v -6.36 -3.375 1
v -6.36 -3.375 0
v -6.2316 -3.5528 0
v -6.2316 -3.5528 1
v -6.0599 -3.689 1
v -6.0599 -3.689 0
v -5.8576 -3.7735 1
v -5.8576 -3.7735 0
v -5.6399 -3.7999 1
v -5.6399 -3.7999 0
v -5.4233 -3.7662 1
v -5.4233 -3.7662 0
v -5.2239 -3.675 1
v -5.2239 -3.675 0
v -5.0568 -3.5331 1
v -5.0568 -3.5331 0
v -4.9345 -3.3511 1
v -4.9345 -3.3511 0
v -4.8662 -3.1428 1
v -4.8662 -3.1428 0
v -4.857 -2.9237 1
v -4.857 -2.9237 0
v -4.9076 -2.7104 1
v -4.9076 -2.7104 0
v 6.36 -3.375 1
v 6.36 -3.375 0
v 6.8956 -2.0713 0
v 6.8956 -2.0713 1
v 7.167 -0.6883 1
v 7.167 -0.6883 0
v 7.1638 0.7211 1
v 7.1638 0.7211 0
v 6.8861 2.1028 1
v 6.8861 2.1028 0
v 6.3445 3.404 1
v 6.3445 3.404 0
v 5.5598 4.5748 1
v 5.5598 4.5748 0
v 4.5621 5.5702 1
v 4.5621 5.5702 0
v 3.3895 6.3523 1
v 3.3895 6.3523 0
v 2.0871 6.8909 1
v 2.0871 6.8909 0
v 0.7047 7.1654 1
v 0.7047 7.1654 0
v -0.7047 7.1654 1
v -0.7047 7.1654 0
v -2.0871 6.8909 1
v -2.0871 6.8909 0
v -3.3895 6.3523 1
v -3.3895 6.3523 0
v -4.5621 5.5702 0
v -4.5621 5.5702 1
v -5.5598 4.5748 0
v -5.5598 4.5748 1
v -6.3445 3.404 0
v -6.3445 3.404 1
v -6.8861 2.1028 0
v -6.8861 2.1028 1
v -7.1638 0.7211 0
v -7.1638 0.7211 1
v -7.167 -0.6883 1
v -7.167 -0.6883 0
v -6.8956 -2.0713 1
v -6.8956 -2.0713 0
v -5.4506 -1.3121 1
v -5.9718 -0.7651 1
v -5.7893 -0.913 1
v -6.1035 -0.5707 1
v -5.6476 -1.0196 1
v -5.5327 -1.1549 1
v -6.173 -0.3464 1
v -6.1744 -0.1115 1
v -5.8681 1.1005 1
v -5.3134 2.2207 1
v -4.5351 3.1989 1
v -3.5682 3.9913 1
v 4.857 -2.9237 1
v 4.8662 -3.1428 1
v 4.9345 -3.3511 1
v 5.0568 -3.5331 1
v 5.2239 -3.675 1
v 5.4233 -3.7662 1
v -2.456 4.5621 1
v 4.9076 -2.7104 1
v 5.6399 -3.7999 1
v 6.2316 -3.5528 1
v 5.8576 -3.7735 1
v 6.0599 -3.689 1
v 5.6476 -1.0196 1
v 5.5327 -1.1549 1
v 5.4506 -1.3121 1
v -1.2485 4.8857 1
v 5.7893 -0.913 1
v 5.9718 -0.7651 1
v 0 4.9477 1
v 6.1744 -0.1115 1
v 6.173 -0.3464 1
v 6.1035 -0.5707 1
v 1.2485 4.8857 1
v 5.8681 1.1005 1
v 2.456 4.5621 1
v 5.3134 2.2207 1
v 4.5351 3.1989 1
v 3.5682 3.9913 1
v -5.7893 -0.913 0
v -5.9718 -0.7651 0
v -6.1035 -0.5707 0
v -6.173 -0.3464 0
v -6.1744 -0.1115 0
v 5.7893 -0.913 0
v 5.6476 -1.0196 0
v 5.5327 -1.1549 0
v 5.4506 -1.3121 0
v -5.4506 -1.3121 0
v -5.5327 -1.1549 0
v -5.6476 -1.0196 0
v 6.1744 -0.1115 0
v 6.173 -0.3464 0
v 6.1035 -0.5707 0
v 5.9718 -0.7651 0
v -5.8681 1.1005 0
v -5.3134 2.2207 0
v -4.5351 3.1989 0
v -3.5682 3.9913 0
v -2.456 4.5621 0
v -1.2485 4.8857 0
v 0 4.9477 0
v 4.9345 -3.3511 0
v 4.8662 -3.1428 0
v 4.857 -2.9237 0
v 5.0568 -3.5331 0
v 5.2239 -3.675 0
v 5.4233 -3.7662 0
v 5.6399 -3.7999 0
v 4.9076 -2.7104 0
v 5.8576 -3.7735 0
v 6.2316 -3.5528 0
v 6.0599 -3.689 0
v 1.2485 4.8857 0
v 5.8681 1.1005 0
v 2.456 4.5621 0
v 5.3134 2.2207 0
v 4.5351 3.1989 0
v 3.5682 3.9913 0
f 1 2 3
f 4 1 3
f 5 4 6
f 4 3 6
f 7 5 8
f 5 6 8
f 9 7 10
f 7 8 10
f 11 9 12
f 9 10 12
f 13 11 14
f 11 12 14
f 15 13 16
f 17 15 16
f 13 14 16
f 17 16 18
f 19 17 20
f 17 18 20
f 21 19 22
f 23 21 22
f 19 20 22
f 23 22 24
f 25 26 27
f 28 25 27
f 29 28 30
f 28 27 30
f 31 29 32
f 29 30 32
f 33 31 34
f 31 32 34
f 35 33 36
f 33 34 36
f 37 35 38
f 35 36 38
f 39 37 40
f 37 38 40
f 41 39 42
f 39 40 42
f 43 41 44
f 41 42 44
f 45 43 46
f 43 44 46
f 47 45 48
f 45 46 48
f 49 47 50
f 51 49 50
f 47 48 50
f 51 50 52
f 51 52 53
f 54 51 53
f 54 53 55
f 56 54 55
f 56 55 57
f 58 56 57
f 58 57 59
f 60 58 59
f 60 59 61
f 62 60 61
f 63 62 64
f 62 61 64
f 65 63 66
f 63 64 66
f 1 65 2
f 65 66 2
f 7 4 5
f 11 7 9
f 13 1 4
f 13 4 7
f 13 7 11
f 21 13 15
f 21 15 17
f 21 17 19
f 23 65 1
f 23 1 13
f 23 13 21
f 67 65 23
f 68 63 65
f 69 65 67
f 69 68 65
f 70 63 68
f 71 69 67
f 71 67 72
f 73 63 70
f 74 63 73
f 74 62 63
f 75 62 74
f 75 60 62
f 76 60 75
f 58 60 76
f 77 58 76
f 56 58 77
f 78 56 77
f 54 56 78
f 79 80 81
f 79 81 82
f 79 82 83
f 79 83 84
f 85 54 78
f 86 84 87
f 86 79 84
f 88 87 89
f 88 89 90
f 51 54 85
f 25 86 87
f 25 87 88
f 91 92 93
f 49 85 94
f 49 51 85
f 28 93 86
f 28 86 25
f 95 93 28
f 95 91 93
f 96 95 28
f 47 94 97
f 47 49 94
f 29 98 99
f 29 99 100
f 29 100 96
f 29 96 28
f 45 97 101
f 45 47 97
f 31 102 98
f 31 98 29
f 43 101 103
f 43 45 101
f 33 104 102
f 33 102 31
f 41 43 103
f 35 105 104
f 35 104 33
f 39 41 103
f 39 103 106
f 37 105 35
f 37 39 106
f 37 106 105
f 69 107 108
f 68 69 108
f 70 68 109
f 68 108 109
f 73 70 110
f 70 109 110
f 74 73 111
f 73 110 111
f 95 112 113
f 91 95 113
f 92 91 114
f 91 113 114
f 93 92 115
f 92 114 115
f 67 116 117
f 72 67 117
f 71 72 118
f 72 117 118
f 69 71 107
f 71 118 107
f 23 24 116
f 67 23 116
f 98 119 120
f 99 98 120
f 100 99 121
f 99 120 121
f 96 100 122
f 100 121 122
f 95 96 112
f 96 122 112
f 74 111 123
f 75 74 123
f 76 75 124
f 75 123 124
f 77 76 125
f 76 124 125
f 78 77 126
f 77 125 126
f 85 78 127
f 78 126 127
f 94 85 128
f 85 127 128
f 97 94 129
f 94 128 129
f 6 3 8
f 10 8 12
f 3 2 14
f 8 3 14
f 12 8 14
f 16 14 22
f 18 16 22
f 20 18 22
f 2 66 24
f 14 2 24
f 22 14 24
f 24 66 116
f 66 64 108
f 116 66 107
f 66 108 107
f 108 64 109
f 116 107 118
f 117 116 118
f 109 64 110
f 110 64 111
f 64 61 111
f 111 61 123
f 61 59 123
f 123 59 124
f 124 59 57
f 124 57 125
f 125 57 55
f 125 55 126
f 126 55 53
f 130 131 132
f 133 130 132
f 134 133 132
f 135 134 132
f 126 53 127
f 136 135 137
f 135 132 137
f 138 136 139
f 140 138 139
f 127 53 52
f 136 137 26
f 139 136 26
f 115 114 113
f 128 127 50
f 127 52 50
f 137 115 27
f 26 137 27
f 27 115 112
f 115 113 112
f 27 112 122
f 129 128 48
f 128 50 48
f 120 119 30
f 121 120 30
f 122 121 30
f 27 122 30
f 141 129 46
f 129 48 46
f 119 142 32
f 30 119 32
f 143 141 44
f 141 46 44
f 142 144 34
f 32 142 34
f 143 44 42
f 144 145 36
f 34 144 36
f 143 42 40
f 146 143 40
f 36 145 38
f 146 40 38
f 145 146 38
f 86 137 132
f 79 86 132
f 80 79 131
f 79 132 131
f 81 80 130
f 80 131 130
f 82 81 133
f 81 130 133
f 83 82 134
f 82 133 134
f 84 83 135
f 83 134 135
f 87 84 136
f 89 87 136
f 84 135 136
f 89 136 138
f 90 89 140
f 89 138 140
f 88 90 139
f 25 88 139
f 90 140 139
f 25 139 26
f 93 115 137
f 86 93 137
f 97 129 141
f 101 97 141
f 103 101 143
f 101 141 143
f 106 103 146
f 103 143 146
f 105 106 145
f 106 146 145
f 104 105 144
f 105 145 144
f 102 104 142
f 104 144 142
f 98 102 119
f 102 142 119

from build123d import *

# Parameters (mm, degrees)
EXTRUSION1_DEPTH = 1


with BuildPart() as part:
    # Esquisse1 → Extrusion1 (new body)
    with BuildSketch(Plane.XY):
        with BuildLine():
            Line((5.45058398, -1.312131796), (4.907576652, -2.710396092))
            ThreePointArc((4.907576652, -2.710396092), (5.320441767, -3.72745699), (6.359982311, -3.375))
            ThreePointArc((6.359982311, -3.375), (0, 7.2), (-6.359982311, -3.375))
            ThreePointArc((-6.359982311, -3.375), (-5.320441767, -3.72745699), (-4.907576652, -2.710396092))
            Line((-4.907576652, -2.710396092), (-5.45058398, -1.312131796))
            ThreePointArc((-5.45058398, -1.312131796), (-5.58638878, -1.084069901), (-5.789339137, -0.91299587))
            ThreePointArc((-5.789339137, -0.91299587), (-6.103454982, -0.570684122), (-6.174372427, -0.111536201))
            ThreePointArc((-6.174372427, -0.111536201), (-4.07266037, 3.620779969), (0, 4.947737042))
            ThreePointArc((0, 4.947737042), (4.07266037, 3.620779969), (6.174372427, -0.111536201))
            ThreePointArc((6.174372427, -0.111536201), (6.103454982, -0.570684122), (5.789339137, -0.91299587))
            ThreePointArc((5.789339137, -0.91299587), (5.58638878, -1.084069901), (5.45058398, -1.312131796))
        make_face()
    extrude(amount=EXTRUSION1_DEPTH)


solid = part.part
